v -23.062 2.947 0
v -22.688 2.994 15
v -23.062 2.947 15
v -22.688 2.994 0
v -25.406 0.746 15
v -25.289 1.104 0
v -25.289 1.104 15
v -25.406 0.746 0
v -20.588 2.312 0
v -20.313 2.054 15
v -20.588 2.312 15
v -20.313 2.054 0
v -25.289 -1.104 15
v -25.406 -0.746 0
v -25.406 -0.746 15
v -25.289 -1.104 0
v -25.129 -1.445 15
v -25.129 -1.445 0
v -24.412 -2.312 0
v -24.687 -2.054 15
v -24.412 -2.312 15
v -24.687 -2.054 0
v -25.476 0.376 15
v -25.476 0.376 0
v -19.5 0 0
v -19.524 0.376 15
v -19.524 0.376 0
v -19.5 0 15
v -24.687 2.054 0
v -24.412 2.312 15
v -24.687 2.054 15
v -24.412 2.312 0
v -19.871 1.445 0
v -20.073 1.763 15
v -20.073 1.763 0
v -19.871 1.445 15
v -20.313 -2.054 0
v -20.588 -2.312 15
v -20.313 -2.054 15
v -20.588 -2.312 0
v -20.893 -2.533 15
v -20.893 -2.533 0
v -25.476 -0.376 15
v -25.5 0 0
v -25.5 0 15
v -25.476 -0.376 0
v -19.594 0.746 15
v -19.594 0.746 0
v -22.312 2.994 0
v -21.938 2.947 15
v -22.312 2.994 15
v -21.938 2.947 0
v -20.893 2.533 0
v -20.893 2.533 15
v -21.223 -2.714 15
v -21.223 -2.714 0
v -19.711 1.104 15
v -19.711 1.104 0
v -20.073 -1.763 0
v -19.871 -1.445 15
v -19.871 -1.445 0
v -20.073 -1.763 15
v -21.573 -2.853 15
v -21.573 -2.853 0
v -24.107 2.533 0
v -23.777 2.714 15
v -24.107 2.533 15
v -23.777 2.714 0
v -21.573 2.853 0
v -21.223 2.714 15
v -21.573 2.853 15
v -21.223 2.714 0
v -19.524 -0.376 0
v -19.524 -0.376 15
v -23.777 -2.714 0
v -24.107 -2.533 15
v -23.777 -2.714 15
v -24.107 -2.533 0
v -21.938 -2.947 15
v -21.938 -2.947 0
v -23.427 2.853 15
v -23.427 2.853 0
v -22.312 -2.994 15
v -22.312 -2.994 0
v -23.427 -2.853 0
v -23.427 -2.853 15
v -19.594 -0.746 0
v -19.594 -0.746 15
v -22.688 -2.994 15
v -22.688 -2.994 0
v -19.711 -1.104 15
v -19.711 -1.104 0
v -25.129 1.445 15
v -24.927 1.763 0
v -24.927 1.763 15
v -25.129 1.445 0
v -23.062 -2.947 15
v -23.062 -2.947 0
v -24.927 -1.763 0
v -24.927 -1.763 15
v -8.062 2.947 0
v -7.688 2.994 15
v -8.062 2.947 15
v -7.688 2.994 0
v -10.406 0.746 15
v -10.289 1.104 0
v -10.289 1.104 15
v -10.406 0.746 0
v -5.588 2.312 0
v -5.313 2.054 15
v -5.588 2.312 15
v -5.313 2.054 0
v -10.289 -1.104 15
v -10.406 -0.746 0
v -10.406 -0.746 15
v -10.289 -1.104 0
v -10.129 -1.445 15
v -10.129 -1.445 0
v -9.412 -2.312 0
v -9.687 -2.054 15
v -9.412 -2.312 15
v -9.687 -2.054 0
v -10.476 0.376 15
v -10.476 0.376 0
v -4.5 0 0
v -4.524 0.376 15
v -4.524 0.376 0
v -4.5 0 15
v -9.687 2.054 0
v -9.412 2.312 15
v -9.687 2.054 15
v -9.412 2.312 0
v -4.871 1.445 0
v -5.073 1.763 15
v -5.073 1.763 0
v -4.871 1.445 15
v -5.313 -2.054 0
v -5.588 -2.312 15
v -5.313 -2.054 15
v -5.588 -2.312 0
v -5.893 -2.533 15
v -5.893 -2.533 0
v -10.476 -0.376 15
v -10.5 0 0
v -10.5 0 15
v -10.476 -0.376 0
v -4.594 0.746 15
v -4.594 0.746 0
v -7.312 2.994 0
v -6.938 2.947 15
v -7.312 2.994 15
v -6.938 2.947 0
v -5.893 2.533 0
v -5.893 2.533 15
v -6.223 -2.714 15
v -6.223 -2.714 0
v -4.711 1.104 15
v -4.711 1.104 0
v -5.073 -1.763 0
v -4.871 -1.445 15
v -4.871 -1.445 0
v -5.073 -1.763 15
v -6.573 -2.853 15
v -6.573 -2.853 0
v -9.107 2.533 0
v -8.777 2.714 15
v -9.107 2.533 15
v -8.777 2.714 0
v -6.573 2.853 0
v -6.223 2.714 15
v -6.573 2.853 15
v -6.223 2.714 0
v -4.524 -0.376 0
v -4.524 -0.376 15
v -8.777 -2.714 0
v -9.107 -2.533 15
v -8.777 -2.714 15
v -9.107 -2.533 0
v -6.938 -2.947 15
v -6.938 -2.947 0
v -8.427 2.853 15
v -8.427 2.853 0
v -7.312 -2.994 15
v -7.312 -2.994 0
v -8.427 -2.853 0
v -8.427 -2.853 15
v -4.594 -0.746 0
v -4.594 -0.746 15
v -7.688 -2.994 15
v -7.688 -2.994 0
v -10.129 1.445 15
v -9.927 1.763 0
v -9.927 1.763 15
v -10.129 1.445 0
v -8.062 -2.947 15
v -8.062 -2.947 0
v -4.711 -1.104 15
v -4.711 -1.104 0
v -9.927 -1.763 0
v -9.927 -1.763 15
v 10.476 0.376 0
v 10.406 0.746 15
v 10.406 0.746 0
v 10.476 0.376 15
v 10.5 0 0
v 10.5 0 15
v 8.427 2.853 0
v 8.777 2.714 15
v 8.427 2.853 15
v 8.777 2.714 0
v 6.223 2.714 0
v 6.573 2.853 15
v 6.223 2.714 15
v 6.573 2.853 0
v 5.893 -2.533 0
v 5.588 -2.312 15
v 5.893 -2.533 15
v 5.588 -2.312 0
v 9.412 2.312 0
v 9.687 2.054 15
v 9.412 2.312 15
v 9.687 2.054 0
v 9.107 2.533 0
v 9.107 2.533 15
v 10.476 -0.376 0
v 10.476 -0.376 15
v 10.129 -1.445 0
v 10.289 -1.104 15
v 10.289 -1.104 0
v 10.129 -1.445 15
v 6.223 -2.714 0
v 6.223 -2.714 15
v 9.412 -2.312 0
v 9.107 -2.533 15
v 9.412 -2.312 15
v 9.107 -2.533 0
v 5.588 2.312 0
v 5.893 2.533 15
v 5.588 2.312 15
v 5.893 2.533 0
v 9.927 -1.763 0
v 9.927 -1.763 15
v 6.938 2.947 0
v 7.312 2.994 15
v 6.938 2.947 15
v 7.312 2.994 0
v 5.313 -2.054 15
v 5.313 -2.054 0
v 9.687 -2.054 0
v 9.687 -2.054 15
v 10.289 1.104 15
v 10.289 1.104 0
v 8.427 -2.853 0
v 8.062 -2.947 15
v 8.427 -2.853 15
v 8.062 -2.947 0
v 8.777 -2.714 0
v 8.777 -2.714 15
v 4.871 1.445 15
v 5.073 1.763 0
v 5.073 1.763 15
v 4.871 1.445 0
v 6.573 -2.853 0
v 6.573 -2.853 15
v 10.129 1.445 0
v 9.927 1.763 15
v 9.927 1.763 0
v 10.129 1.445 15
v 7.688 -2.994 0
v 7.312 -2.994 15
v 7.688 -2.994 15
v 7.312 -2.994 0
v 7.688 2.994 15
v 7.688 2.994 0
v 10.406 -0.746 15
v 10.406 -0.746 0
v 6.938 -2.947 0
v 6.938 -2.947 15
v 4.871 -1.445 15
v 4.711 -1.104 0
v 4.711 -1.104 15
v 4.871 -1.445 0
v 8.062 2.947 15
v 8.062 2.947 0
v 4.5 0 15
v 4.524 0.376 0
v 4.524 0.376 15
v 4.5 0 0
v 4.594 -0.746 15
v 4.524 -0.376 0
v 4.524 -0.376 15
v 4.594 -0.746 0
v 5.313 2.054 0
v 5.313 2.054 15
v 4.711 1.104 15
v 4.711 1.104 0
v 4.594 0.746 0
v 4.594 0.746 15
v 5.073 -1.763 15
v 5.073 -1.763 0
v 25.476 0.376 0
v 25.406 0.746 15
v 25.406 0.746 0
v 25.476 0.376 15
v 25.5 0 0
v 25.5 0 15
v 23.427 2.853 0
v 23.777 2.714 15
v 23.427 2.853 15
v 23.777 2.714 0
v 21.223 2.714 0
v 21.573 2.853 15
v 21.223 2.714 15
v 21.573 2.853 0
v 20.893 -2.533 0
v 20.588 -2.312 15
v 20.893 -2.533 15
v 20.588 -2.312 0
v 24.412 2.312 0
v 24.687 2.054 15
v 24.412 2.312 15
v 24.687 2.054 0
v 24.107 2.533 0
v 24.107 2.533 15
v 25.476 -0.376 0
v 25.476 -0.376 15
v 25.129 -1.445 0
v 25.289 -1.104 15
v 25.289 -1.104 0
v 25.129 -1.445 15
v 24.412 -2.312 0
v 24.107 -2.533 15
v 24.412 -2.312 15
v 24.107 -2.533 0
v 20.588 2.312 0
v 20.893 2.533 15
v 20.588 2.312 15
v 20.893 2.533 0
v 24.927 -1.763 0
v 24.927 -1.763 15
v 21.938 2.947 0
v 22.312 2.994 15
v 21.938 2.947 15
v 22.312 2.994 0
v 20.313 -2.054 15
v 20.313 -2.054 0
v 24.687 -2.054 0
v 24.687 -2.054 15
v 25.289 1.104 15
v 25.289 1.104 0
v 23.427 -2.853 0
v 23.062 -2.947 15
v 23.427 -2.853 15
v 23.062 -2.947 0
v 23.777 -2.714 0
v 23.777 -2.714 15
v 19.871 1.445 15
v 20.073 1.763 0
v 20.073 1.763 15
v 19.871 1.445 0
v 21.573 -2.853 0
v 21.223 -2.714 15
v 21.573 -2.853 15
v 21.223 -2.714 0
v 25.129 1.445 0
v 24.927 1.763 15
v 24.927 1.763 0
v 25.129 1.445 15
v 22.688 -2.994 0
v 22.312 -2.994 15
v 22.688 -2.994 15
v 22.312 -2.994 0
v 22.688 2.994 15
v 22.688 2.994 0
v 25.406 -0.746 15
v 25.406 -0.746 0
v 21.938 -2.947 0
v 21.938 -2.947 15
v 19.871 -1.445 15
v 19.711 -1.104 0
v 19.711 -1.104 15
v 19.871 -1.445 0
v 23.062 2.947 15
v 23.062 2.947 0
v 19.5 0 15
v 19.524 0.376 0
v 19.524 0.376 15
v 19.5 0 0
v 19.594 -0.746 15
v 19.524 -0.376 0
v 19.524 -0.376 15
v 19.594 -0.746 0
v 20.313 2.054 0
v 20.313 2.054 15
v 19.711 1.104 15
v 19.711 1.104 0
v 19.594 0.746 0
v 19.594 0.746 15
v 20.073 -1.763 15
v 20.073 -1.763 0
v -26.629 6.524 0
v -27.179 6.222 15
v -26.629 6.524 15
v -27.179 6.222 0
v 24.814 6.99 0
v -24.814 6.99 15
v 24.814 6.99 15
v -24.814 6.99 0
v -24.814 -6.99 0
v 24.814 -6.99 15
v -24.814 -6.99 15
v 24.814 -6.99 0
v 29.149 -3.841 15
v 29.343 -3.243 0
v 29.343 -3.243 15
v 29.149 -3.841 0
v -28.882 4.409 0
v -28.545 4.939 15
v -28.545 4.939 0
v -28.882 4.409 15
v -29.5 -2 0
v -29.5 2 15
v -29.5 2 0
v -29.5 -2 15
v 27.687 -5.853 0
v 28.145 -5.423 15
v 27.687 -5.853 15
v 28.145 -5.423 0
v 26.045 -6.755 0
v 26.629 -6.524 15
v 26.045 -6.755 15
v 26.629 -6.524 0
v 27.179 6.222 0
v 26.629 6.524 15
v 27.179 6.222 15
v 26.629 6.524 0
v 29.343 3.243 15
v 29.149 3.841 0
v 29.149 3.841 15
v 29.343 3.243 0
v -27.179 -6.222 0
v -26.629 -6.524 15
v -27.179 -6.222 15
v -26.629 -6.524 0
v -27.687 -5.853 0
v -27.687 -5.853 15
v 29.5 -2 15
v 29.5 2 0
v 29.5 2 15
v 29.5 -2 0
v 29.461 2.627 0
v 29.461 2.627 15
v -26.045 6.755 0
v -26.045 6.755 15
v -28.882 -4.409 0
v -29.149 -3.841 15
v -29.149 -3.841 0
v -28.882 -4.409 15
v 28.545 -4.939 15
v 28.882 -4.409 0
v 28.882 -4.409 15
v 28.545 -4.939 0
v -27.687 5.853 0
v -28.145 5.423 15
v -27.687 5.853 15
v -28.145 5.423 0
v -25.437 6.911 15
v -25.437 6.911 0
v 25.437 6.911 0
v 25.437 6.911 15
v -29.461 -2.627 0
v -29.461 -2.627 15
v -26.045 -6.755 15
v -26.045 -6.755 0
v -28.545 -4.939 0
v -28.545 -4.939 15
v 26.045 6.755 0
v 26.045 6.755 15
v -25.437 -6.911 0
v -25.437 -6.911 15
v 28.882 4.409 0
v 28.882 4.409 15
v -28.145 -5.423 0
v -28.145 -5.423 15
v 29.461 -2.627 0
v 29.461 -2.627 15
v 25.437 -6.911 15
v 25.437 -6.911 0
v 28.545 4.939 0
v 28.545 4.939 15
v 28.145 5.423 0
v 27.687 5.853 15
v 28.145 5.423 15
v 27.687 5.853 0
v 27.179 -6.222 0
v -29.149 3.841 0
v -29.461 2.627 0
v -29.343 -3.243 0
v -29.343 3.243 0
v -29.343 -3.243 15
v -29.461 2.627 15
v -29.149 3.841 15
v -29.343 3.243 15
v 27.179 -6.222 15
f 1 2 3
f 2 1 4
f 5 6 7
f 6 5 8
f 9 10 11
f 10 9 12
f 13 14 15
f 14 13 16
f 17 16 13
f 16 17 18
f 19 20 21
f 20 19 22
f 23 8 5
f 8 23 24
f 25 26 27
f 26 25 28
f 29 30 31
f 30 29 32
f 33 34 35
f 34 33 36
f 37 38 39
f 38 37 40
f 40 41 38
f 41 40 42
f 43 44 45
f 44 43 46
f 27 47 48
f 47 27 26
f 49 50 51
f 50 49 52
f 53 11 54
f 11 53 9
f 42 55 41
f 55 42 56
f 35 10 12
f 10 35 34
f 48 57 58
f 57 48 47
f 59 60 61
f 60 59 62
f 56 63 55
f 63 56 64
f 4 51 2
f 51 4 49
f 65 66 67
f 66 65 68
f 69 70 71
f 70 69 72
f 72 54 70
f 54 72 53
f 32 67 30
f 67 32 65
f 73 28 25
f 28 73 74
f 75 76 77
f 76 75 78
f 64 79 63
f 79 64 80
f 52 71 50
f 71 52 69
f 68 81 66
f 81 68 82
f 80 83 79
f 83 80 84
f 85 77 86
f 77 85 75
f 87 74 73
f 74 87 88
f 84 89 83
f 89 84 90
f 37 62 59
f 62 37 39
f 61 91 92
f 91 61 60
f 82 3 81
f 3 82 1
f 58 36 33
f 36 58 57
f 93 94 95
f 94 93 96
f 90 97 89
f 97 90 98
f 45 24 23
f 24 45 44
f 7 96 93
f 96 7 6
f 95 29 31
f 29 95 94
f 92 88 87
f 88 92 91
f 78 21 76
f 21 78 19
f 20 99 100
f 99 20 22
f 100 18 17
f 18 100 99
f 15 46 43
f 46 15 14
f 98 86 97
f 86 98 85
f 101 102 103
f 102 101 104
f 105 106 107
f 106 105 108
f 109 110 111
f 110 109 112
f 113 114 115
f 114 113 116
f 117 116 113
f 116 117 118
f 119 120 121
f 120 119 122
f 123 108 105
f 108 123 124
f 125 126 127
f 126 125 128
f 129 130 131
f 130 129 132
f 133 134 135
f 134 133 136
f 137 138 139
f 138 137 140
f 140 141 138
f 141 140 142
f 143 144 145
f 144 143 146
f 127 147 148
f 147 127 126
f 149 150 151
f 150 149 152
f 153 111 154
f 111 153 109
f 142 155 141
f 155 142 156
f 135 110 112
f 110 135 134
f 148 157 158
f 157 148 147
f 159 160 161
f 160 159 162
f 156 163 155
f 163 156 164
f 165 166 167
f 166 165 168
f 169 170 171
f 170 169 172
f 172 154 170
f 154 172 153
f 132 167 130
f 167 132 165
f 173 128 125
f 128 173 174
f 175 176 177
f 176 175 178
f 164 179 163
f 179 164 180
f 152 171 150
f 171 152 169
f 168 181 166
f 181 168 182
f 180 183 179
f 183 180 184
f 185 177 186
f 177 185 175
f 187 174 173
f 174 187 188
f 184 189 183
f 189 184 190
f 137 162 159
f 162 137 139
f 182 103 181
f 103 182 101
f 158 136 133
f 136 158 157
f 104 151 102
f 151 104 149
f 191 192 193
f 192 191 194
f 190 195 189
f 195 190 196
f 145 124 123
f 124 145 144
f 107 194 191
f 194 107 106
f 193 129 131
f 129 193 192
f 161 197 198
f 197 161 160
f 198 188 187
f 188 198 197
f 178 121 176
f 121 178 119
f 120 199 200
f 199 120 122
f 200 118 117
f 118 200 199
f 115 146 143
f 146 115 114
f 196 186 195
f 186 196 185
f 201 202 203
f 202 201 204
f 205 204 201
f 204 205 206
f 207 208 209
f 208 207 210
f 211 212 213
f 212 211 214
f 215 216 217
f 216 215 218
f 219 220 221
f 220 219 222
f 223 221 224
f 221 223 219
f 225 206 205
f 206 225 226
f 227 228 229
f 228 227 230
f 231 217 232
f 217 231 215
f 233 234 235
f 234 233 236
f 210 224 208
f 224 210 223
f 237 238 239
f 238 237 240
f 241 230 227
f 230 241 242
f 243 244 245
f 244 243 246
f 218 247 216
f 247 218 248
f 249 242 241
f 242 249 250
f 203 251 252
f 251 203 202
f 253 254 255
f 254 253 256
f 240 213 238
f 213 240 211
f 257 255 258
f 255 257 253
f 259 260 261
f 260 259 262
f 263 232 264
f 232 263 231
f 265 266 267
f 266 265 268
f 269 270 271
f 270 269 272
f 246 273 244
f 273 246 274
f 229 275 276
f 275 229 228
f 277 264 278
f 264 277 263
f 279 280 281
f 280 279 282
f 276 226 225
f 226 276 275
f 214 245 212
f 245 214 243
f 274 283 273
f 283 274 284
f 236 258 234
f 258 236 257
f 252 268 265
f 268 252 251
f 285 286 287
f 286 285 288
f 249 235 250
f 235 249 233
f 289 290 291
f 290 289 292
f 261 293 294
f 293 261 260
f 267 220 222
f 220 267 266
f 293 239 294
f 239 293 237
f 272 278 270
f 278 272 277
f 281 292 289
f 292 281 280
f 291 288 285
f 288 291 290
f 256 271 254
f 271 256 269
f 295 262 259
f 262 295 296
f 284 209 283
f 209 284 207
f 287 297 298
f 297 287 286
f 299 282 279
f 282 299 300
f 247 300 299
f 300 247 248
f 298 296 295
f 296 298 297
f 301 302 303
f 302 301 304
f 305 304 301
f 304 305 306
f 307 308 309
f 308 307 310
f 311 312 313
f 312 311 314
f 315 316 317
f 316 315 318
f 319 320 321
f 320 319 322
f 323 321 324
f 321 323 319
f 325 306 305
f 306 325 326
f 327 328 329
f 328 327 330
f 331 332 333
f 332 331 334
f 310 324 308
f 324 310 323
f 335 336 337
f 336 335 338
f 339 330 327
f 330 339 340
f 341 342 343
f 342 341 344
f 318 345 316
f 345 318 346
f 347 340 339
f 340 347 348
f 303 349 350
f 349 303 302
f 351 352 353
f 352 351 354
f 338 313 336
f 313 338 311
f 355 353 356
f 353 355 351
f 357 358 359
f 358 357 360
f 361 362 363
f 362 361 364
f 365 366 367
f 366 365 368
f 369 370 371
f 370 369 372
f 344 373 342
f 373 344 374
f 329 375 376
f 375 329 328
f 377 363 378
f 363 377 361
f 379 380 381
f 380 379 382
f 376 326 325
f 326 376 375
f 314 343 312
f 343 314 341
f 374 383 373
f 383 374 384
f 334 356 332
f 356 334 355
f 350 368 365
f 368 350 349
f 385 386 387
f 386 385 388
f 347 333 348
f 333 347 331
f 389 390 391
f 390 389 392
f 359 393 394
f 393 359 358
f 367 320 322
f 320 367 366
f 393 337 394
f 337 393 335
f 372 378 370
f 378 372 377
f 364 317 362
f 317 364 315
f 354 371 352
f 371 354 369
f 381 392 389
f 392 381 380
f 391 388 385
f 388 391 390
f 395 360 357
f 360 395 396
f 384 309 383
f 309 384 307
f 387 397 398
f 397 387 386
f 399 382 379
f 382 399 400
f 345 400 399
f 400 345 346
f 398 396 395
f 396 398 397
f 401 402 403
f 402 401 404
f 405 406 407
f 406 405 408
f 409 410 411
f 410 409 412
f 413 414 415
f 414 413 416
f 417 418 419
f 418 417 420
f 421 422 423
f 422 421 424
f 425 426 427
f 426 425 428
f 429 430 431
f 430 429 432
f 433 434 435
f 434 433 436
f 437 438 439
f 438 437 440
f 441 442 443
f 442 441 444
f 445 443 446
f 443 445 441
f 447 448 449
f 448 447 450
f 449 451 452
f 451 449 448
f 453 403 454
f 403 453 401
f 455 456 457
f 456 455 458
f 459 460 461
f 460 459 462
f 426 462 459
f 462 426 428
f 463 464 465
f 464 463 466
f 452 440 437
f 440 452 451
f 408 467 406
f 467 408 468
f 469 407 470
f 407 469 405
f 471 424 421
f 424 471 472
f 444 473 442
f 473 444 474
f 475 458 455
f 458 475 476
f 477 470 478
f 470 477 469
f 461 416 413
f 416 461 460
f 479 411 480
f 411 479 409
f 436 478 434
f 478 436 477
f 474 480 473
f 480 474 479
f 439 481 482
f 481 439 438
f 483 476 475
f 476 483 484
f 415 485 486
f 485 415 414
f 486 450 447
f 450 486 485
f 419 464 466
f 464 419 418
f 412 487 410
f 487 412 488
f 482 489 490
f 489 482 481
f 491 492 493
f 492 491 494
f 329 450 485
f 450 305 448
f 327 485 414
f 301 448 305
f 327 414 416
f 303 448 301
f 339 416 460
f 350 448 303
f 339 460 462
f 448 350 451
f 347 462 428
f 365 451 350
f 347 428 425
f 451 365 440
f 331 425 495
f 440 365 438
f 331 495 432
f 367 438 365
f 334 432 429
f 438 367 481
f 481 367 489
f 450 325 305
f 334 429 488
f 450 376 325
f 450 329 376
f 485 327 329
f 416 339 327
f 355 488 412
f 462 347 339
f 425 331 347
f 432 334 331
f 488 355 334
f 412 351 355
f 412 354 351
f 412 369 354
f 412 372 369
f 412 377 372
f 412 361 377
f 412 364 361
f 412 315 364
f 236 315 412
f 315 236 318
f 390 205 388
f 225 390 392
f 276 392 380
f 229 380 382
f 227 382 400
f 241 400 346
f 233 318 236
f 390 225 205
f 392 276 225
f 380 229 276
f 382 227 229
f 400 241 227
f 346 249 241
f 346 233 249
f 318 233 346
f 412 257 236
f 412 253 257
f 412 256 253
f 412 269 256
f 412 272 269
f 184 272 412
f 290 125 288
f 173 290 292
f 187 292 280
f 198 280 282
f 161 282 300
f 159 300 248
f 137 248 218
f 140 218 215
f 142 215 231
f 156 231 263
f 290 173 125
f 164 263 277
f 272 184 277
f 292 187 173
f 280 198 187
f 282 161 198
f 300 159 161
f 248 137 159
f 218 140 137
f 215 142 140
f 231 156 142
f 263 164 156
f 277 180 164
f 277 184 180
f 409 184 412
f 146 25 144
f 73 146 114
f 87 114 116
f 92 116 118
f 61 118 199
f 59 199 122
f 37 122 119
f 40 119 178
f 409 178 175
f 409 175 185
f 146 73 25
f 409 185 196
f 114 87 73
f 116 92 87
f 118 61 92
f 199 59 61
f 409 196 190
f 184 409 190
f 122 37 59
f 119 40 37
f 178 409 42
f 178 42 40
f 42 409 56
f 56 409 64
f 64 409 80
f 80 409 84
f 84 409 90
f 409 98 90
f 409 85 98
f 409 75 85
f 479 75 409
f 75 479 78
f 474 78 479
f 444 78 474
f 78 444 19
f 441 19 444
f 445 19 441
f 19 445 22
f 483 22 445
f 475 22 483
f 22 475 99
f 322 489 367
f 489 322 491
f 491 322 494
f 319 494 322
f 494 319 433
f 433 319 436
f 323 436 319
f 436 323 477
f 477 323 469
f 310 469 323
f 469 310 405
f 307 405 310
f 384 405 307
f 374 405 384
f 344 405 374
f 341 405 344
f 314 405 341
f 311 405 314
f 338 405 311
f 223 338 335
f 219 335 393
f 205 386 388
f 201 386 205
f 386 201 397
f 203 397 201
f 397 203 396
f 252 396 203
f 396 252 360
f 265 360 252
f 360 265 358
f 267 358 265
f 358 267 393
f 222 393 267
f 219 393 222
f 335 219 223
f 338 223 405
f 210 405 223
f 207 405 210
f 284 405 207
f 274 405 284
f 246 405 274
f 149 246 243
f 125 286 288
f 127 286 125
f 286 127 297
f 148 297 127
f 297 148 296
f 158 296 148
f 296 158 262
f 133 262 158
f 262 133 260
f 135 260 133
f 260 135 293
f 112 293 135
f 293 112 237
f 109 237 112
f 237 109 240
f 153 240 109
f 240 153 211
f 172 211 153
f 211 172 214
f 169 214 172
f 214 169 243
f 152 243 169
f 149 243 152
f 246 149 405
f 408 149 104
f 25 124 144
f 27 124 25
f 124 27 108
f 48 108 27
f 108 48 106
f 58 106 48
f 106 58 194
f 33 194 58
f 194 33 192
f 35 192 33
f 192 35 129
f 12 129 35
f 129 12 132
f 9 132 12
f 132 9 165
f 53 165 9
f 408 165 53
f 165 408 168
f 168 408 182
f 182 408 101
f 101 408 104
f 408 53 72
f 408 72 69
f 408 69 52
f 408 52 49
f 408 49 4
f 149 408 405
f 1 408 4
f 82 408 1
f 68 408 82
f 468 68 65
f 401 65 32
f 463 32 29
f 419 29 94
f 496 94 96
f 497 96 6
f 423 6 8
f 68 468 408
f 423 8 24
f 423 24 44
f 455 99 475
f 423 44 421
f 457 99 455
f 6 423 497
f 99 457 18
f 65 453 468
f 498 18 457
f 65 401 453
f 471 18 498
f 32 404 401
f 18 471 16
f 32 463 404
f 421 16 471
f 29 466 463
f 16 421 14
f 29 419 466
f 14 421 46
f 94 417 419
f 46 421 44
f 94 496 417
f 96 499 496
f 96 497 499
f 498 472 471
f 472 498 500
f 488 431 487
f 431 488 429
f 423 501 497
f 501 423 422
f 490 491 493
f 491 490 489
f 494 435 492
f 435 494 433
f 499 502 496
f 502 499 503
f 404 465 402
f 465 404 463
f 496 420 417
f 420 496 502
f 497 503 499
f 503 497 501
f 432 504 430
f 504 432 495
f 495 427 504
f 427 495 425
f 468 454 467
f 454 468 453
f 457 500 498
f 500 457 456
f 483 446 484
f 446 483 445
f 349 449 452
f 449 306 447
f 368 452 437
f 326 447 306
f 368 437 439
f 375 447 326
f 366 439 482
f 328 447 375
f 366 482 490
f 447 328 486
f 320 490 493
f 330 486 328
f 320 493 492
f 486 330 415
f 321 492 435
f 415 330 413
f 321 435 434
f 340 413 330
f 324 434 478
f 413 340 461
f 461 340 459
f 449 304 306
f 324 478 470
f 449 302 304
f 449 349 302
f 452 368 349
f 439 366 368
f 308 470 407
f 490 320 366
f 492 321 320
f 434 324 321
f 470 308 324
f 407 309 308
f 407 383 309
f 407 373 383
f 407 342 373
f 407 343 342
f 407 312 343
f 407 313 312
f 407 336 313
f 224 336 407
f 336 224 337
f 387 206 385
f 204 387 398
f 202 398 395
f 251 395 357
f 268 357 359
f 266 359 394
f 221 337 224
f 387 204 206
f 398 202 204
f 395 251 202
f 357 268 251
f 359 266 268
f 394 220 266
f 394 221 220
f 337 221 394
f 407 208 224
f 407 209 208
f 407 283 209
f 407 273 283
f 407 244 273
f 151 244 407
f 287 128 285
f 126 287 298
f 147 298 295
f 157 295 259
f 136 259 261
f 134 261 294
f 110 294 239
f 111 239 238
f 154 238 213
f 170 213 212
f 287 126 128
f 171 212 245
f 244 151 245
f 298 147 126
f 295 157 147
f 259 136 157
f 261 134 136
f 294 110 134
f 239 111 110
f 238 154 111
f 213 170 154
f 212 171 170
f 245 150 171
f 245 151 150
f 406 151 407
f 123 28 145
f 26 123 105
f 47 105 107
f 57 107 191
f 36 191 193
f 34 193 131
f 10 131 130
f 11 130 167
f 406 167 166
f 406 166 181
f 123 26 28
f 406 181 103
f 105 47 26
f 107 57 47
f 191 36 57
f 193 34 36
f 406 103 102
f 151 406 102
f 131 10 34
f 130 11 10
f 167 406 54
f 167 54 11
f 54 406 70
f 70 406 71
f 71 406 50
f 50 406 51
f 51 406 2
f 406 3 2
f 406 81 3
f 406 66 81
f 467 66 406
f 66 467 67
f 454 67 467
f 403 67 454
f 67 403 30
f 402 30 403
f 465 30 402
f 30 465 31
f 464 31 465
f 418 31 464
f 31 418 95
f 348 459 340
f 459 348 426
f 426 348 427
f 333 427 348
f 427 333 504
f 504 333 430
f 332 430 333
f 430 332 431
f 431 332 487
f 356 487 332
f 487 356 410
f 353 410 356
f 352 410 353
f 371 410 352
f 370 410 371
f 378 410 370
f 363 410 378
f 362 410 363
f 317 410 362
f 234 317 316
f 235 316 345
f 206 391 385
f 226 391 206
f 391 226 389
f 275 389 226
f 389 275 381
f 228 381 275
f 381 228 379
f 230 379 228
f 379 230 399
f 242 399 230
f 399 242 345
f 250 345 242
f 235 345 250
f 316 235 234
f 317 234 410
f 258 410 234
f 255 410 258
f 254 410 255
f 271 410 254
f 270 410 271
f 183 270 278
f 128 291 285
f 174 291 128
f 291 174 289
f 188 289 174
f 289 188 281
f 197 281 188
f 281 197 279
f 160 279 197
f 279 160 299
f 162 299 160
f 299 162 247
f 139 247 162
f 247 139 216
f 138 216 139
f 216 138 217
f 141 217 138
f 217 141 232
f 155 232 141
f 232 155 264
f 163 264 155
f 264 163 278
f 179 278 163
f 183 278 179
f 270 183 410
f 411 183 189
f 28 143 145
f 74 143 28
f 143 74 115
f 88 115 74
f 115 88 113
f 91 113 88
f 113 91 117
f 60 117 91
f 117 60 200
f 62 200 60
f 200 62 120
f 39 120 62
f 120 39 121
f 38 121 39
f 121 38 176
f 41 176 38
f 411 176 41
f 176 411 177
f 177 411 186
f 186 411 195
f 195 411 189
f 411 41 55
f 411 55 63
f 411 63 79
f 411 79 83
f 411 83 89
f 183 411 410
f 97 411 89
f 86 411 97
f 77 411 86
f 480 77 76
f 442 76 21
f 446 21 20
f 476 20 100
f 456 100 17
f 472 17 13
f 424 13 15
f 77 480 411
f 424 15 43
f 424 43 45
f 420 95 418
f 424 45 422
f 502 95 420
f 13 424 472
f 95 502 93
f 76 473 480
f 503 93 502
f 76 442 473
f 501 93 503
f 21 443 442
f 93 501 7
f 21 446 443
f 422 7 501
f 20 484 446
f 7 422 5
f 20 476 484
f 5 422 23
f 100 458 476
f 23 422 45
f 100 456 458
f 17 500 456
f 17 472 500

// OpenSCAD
$fn = 50;


difference() {
	union() {
		hull() {
			translate(v = [-24.5000000000, 2.0000000000, 0]) {
				cylinder(h = 15, r = 5);
			}
			translate(v = [24.5000000000, 2.0000000000, 0]) {
				cylinder(h = 15, r = 5);
			}
			translate(v = [-24.5000000000, -2.0000000000, 0]) {
				cylinder(h = 15, r = 5);
			}
			translate(v = [24.5000000000, -2.0000000000, 0]) {
				cylinder(h = 15, r = 5);
			}
		}
	}
	union() {
		translate(v = [-22.5000000000, 0.0000000000, 0]) {
			translate(v = [0, 0, -100]) {
				cylinder(h = 200, r = 3.0000000000);
			}
		}
		translate(v = [-7.5000000000, 0.0000000000, 0]) {
			translate(v = [0, 0, -100]) {
				cylinder(h = 200, r = 3.0000000000);
			}
		}
		translate(v = [7.5000000000, 0.0000000000, 0]) {
			translate(v = [0, 0, -100]) {
				cylinder(h = 200, r = 3.0000000000);
			}
		}
		translate(v = [22.5000000000, 0.0000000000, 0]) {
			translate(v = [0, 0, -100]) {
				cylinder(h = 200, r = 3.0000000000);
			}
		}
	}
}
